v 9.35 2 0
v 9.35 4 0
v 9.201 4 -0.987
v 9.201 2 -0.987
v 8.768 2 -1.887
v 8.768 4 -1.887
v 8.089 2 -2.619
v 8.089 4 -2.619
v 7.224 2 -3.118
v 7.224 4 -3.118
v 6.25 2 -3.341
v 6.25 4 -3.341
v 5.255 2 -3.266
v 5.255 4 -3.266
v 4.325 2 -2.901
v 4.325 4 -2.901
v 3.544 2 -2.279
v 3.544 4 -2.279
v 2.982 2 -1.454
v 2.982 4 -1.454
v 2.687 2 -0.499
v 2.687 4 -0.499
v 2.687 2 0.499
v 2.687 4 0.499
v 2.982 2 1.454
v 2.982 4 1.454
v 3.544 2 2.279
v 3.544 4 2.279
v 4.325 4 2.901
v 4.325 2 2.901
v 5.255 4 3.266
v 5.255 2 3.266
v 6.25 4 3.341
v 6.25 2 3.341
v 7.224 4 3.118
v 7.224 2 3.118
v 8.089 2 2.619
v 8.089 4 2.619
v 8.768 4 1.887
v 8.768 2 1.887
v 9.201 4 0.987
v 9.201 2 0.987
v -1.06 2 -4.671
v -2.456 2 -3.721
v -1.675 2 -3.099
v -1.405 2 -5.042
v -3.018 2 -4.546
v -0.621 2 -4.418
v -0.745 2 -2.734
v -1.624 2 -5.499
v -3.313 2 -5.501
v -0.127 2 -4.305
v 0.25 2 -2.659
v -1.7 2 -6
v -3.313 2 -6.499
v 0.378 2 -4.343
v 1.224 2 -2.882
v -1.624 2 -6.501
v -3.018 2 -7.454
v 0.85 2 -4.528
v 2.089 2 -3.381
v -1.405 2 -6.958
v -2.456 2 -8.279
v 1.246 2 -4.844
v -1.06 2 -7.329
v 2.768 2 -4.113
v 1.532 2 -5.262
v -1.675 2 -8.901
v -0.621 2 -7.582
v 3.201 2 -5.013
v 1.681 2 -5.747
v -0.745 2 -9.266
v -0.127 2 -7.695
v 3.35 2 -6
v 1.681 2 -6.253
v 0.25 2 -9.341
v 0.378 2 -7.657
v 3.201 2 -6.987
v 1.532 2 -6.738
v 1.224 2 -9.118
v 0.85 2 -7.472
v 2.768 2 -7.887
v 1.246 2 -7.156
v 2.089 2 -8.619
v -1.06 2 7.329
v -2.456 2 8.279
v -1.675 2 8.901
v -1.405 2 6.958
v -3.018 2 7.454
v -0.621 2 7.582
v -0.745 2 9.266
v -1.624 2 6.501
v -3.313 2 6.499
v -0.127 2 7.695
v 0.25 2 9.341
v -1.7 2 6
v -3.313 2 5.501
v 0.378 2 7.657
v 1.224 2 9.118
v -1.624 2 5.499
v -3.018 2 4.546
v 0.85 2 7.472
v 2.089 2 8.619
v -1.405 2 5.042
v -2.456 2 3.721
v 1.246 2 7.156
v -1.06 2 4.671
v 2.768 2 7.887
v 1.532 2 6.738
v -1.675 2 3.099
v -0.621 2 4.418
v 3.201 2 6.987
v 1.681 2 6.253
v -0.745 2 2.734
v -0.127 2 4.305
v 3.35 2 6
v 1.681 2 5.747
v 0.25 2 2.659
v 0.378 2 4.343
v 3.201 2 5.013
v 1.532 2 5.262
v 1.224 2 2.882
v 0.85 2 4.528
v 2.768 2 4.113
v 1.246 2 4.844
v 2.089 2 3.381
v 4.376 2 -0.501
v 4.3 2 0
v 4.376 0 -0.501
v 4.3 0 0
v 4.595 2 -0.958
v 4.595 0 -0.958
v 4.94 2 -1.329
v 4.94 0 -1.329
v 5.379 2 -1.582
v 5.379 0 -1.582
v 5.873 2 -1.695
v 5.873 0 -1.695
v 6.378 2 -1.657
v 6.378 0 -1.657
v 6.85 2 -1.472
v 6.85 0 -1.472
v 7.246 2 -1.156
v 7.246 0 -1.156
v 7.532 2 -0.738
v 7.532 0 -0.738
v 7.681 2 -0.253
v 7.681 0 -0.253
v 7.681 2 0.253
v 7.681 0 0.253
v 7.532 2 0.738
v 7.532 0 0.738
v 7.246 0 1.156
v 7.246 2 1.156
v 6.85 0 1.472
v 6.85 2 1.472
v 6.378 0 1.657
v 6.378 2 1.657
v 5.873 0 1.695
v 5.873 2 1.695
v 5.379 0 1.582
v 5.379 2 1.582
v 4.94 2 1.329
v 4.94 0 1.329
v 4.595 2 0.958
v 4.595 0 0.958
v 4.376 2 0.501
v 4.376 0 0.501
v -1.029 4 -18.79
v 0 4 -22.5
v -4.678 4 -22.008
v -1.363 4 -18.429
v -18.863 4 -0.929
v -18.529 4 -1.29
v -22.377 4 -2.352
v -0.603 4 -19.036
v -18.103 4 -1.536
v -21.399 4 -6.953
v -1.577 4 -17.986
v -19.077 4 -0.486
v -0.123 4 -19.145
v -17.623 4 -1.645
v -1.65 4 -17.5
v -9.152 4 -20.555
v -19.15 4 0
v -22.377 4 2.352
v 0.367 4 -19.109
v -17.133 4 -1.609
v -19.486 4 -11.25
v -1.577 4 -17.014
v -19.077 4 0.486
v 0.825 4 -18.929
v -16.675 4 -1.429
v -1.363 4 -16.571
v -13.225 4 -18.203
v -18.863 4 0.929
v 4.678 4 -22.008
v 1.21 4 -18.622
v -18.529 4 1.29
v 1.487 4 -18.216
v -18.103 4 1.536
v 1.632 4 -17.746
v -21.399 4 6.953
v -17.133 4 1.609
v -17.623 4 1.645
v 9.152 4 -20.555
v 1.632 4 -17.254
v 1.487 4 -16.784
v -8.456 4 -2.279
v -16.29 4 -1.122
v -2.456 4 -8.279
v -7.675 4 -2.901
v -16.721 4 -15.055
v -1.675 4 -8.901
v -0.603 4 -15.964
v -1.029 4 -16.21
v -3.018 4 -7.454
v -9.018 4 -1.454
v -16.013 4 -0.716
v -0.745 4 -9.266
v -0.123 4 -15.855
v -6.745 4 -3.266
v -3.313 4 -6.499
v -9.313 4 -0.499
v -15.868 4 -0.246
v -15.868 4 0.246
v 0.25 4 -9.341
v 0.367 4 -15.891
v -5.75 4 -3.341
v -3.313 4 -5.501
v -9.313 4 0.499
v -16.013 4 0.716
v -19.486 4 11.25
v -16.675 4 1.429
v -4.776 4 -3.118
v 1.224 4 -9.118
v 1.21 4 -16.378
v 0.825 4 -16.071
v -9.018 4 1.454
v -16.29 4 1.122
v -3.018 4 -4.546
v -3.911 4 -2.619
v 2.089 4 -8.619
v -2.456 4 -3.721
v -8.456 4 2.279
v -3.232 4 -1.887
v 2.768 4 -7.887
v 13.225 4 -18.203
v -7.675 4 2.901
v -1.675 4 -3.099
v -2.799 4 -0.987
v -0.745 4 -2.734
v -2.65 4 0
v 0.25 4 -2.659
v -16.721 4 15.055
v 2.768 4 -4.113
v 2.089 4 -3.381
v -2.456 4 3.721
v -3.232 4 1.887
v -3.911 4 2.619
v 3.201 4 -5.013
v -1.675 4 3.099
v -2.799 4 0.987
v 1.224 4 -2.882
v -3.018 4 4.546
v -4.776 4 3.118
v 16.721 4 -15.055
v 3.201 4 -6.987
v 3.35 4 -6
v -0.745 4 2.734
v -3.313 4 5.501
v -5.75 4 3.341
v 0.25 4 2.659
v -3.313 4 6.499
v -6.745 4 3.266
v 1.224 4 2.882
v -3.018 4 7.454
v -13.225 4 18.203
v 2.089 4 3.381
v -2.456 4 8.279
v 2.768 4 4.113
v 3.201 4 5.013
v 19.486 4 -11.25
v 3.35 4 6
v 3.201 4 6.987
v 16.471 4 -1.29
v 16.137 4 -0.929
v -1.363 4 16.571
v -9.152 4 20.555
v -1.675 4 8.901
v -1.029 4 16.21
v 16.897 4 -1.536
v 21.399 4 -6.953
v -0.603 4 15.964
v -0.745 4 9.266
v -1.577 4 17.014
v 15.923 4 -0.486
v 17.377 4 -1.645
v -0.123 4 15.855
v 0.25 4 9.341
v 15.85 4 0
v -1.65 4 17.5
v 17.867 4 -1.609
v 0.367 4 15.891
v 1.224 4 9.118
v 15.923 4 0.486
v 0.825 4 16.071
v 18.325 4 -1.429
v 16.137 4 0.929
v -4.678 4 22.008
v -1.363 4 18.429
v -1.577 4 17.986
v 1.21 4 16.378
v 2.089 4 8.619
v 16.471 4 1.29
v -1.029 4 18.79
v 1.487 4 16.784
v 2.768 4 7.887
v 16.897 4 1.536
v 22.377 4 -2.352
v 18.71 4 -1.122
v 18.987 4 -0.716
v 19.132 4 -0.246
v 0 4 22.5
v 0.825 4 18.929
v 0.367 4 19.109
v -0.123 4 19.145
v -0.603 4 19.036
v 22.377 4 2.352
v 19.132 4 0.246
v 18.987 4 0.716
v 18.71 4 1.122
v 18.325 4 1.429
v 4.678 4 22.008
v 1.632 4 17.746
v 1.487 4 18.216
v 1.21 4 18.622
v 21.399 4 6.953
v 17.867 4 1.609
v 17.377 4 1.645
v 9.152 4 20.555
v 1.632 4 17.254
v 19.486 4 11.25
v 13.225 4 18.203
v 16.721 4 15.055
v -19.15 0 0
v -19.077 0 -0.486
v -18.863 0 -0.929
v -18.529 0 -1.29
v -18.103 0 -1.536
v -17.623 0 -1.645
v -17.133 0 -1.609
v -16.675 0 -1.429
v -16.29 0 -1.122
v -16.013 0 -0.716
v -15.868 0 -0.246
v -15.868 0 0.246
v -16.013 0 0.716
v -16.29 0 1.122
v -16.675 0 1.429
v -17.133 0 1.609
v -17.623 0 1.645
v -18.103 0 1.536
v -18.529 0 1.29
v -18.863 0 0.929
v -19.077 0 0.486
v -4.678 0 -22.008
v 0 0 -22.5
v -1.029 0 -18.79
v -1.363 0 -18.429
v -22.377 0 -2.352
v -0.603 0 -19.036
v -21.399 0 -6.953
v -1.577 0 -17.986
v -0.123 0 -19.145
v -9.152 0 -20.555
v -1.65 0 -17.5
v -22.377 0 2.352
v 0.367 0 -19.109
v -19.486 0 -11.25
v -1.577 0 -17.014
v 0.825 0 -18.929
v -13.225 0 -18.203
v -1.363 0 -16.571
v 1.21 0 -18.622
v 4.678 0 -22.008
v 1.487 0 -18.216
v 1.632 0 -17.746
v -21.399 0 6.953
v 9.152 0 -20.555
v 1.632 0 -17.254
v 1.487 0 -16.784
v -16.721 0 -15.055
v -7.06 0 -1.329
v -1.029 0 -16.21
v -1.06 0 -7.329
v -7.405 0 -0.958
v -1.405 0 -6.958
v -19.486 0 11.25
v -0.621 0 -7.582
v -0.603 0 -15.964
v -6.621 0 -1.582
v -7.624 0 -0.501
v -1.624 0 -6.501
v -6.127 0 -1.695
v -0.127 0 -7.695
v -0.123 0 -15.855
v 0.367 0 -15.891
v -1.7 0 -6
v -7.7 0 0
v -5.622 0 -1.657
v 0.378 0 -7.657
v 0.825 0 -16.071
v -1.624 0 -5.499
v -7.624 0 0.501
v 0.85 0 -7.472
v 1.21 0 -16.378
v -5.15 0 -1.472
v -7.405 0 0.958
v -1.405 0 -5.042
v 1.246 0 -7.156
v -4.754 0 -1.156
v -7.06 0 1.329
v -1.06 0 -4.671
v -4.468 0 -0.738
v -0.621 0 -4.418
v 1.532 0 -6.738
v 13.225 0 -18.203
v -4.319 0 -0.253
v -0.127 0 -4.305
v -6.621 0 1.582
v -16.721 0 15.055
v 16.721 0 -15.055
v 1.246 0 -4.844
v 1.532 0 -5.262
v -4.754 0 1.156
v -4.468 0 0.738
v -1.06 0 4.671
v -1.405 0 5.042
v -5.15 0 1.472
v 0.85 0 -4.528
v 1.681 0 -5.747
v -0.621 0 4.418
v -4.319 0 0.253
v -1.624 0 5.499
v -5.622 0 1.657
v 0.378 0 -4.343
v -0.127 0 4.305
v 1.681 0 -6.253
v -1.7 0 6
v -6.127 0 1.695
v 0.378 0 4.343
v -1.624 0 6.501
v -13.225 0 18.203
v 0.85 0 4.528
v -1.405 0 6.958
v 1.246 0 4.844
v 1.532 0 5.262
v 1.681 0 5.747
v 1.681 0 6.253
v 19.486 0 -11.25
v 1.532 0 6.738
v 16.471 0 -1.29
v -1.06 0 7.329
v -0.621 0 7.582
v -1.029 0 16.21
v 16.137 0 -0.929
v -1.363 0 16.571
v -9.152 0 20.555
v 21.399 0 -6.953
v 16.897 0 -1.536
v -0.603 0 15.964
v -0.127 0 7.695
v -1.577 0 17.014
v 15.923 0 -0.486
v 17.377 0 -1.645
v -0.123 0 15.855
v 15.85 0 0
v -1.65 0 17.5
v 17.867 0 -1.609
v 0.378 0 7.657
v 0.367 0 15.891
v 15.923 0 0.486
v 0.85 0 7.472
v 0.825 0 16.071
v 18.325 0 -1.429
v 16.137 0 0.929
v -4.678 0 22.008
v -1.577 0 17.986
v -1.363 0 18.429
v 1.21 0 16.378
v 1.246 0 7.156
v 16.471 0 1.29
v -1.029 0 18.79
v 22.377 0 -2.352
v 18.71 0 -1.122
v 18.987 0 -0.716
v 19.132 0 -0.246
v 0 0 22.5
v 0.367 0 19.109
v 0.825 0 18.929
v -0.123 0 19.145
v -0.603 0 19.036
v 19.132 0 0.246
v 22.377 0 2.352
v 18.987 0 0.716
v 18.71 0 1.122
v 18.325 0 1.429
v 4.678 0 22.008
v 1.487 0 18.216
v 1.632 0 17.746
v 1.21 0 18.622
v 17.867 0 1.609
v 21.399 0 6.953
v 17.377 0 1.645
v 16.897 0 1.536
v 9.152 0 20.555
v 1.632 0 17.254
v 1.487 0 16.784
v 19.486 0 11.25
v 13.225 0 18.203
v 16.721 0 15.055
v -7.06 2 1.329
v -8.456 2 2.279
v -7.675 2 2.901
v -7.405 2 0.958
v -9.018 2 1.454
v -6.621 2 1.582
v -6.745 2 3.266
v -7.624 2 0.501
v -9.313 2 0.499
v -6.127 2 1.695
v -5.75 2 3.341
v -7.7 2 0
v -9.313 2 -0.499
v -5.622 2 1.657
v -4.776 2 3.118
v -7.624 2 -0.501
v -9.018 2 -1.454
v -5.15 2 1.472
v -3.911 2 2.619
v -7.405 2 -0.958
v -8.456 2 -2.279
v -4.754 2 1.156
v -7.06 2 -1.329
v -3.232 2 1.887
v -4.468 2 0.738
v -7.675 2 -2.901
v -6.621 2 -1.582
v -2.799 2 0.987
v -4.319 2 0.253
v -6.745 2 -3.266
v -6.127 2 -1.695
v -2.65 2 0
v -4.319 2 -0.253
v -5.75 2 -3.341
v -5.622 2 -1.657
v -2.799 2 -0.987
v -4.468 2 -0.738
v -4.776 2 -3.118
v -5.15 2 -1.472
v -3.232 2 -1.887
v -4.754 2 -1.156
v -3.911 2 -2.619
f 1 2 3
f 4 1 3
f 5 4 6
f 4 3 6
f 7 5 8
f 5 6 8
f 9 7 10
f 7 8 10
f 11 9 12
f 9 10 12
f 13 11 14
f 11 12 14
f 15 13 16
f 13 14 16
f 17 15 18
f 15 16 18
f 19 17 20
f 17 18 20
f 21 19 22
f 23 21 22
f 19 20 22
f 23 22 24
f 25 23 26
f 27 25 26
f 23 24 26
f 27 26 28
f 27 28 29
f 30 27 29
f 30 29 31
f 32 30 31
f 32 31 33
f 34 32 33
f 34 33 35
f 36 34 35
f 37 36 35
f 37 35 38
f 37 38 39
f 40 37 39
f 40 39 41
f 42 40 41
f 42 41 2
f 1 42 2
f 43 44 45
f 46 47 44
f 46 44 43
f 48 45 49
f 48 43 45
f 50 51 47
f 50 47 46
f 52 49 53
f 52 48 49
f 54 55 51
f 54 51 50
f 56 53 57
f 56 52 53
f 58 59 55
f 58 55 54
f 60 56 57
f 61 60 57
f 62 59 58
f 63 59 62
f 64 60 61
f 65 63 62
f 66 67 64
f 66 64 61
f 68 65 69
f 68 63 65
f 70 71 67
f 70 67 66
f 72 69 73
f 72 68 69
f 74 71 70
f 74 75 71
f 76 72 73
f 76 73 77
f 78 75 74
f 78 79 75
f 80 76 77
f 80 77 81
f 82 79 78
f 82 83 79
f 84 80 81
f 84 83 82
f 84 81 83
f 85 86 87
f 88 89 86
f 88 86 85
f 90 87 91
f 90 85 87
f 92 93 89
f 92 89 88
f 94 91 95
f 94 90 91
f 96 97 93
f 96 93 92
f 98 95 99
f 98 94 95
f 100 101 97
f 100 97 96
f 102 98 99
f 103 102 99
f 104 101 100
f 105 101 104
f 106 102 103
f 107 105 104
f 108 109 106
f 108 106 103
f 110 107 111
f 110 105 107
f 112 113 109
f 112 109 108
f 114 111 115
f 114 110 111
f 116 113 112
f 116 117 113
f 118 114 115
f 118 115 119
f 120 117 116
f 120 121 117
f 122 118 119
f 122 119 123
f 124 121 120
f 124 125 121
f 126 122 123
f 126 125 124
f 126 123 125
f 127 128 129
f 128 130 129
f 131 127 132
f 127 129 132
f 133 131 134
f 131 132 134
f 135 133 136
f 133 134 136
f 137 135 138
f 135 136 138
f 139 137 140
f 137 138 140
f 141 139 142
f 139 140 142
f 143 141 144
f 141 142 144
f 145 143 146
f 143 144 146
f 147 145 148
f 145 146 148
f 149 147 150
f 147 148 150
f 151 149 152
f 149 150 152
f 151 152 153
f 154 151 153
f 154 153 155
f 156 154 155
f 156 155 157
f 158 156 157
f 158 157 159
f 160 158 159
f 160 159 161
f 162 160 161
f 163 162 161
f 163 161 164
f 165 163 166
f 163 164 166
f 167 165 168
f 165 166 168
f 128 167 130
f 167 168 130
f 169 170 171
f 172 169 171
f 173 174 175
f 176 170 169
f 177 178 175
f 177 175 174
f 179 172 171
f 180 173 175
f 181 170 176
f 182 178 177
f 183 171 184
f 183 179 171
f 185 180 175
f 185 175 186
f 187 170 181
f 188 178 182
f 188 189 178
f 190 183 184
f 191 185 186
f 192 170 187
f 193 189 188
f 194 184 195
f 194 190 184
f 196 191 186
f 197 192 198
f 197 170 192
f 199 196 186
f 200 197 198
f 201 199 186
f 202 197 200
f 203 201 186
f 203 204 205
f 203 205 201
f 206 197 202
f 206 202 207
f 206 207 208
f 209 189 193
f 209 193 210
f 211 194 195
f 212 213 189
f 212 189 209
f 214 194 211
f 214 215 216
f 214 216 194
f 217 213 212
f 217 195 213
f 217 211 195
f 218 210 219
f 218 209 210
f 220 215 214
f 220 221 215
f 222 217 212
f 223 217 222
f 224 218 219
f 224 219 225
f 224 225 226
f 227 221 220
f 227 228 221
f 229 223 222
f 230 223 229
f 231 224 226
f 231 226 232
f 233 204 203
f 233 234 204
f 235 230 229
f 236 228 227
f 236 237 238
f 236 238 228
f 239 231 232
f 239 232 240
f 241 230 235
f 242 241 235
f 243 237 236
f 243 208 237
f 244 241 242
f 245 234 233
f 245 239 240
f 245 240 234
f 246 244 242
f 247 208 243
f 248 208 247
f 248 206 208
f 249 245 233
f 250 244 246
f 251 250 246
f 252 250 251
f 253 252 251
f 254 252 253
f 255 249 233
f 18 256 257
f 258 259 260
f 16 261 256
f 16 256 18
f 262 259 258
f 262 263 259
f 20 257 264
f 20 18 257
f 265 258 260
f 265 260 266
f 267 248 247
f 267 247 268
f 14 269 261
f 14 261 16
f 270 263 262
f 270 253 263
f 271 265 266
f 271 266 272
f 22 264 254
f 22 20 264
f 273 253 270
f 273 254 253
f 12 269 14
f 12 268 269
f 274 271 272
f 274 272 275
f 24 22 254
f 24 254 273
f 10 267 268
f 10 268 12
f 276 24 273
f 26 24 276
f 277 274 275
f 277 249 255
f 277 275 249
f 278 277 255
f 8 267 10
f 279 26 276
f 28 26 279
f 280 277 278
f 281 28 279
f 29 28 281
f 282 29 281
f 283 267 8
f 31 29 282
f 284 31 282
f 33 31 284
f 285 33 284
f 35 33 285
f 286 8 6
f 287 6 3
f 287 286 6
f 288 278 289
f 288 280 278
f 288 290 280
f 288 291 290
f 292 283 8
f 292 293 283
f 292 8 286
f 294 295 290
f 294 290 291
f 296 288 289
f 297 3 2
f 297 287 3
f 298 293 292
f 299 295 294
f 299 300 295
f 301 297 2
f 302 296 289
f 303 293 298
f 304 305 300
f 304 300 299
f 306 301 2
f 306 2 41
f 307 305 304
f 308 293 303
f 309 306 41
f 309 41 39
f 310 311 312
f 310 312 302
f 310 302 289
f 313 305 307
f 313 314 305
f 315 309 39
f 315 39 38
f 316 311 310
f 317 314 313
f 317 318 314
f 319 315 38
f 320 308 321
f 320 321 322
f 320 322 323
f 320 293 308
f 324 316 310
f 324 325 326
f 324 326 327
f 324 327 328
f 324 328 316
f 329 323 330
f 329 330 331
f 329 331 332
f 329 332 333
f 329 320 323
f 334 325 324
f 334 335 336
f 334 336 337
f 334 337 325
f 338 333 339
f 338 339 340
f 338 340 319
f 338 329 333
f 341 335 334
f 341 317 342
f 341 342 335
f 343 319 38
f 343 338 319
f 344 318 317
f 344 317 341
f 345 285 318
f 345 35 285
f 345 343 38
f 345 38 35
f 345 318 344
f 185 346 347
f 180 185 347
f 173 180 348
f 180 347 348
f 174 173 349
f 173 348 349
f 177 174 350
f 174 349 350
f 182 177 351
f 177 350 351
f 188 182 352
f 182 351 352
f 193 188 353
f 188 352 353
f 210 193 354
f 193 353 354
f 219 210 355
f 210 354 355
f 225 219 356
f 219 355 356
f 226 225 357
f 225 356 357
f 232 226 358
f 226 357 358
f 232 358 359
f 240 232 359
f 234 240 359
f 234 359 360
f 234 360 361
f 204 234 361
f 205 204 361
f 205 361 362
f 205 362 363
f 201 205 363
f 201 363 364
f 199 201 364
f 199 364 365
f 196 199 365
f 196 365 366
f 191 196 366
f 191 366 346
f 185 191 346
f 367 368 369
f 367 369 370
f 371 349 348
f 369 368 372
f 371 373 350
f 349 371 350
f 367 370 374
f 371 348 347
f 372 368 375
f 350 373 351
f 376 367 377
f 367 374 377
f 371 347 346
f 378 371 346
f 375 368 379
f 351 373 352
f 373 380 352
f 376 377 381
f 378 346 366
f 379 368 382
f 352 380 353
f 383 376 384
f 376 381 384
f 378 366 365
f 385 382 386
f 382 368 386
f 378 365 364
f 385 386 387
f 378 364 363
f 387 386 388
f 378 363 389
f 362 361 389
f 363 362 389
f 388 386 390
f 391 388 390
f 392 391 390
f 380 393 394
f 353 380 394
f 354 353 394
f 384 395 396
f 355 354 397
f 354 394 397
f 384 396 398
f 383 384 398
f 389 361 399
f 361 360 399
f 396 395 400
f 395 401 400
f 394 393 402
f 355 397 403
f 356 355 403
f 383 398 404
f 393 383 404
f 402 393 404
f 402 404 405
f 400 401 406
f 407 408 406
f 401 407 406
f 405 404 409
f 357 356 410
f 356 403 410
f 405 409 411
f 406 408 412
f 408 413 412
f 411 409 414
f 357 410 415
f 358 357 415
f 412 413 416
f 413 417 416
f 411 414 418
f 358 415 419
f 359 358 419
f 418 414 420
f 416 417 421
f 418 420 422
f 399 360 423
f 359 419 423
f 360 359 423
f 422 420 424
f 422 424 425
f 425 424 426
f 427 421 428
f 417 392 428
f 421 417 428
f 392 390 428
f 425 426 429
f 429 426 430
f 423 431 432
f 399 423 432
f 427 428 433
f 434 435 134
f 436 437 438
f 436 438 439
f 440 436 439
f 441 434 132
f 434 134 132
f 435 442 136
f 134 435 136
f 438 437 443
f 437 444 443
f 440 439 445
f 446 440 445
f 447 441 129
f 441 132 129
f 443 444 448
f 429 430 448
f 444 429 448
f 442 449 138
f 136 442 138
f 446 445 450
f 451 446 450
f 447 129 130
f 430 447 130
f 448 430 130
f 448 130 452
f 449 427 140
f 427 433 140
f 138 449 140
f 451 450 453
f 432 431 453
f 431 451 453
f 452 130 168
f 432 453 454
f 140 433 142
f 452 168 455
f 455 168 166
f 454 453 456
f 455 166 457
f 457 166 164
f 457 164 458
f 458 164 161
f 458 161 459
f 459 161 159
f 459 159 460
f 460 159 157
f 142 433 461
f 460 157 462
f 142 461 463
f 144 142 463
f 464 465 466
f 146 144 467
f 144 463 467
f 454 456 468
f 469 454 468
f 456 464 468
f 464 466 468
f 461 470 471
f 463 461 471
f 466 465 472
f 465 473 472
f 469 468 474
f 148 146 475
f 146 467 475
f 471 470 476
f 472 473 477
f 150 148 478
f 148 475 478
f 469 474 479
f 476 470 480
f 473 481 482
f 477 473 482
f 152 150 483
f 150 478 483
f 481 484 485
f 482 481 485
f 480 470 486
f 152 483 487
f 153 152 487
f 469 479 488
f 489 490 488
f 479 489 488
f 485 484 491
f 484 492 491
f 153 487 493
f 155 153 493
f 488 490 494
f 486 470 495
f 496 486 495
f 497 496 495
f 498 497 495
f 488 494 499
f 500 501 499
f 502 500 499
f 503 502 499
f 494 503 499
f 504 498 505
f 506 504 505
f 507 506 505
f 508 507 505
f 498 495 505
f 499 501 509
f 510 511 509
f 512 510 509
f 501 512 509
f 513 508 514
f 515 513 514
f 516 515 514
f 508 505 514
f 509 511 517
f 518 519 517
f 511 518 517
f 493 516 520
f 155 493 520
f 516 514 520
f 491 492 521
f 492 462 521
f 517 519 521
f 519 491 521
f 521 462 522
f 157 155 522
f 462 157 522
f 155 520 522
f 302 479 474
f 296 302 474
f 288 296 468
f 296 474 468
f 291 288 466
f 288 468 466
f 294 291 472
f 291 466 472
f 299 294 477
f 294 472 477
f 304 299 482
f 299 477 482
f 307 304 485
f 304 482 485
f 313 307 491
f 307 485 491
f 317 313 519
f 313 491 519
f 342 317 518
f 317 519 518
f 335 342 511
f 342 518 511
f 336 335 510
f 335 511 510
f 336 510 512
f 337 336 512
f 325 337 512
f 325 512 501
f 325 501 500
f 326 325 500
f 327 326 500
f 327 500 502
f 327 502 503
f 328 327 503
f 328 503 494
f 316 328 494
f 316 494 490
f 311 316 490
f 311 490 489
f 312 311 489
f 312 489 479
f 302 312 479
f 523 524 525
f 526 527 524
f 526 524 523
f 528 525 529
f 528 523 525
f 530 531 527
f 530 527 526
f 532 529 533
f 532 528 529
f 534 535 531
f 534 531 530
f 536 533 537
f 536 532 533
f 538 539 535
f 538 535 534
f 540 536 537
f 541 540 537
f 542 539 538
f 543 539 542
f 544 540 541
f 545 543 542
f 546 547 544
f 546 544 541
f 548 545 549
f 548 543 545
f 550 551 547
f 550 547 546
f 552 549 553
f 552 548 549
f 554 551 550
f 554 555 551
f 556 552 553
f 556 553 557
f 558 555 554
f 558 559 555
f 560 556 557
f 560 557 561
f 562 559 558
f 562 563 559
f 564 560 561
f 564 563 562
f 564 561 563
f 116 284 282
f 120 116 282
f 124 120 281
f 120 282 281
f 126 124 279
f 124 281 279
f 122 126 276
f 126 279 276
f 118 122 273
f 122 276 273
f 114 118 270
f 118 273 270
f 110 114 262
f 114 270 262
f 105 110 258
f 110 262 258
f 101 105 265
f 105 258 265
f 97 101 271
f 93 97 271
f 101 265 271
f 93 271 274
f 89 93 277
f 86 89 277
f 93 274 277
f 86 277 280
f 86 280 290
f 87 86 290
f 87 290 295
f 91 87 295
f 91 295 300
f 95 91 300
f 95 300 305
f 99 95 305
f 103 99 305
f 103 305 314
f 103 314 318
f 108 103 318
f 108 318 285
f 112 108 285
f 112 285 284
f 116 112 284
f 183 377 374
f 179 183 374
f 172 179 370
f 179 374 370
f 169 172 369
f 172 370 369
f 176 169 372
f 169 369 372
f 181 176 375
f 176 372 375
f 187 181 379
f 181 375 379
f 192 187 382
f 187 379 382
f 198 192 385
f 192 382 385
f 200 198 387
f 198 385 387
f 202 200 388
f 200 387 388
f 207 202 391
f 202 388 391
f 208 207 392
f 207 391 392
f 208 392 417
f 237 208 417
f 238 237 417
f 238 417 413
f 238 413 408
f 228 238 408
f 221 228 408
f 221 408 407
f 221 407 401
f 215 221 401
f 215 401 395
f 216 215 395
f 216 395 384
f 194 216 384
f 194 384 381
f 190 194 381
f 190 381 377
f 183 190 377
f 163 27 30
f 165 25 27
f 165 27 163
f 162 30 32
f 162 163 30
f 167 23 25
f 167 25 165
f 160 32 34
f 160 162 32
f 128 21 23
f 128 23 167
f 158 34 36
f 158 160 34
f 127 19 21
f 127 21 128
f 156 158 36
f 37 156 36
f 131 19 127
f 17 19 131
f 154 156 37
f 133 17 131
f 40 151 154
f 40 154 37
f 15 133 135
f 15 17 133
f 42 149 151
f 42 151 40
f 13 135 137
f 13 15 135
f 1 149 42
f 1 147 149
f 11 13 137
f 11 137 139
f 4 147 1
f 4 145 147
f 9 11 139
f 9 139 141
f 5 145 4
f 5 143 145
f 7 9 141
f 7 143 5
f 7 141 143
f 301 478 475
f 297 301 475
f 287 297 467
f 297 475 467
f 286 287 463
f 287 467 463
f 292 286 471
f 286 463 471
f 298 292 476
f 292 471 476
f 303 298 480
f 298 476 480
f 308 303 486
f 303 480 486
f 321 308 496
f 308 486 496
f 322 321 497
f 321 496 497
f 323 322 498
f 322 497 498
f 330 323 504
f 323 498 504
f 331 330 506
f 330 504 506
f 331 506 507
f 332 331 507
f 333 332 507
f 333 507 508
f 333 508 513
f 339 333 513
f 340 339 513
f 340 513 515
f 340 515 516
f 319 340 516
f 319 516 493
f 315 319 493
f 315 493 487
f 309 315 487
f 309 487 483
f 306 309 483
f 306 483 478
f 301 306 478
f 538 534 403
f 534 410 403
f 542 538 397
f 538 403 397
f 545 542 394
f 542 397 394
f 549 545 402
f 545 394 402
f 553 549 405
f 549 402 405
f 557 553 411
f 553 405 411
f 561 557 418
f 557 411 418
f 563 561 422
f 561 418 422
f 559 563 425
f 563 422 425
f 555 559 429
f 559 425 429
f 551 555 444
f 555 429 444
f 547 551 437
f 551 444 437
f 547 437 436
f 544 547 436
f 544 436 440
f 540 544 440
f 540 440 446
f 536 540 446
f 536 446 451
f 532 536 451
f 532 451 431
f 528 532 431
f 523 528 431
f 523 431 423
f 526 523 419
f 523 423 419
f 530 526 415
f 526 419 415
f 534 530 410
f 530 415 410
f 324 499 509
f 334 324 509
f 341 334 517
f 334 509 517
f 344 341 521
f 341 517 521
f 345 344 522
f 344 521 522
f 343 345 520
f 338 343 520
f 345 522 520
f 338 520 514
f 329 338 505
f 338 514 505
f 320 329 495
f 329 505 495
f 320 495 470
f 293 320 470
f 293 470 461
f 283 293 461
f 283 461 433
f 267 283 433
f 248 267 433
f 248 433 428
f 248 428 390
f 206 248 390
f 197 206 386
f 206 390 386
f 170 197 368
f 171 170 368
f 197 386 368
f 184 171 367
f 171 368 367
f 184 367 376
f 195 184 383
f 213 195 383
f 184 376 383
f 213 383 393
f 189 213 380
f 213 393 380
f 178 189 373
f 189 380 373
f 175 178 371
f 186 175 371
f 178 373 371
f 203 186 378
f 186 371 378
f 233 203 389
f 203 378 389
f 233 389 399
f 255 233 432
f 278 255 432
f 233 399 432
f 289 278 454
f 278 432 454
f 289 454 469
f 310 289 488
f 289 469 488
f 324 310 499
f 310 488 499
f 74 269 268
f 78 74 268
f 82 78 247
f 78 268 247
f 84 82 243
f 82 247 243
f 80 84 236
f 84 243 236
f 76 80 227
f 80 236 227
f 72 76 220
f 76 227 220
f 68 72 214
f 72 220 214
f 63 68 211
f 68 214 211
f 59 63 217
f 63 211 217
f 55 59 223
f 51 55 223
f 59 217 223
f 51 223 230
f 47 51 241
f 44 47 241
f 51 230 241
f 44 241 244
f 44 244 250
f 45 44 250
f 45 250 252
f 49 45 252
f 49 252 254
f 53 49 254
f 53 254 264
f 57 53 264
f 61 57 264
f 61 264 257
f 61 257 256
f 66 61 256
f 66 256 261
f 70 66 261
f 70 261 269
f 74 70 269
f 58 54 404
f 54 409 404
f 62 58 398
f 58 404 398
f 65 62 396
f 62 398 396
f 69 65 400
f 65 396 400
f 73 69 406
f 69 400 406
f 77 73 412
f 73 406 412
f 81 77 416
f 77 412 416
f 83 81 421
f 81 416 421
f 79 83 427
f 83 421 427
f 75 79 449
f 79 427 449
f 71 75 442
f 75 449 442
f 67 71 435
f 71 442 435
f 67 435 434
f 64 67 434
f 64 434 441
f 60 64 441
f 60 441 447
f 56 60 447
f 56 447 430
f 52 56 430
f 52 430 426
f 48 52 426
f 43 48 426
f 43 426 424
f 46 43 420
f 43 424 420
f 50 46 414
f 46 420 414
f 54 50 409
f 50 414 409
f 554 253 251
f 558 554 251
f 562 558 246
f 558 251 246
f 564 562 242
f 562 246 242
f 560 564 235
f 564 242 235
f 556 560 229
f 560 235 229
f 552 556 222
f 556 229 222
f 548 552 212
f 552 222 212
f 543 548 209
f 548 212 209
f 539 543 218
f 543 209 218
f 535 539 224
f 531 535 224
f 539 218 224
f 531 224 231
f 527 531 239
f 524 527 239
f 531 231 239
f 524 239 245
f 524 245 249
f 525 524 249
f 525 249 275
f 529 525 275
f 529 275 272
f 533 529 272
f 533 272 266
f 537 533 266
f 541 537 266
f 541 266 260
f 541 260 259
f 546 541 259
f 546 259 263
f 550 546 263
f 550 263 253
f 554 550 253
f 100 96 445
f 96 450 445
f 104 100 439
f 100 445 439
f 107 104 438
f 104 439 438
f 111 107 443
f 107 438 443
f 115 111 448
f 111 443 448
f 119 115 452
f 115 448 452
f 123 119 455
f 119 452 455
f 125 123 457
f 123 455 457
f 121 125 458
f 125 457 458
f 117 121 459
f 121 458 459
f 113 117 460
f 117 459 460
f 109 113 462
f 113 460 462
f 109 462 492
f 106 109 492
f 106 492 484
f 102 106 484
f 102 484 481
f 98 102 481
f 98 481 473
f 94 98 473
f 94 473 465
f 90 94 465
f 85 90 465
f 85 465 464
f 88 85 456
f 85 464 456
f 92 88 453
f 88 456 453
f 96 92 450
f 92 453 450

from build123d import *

# Parameters (mm, degrees)
SKETCH_1_R                  = 22.5
EXTRUDE_1_DEPTH             = 4
HOLE_WIZARD_M31_D           = 3.4
HOLE_WIZARD_M31_CBORE_D     = 6.7
HOLE_WIZARD_M31_CBORE_DEPTH = 2
M4X0_71_D                   = 3.3


with BuildPart() as part:
    # Эскиз1 → Бобышка-Вытянуть1 (new body)
    with BuildSketch(Plane(origin=(0, 0, 0), x_dir=(1, 0, 0), z_dir=(0, 1, 0))):
        with Locations(Location((0, 0, 0), (0, 0, 270))):
            Circle(SKETCH_1_R)
    extrude(amount=EXTRUDE_1_DEPTH)

    # Цековка для  винта с полукруглой головкой M31 (through all)
    with Locations(Plane(origin=(0, 4, 0), x_dir=(1, 0, 0), z_dir=(0, 1, 0))):
        with Locations((0, 6), (-6, 0), (0, -6), (6, 0)):
            CounterBoreHole(HOLE_WIZARD_M31_D / 2, HOLE_WIZARD_M31_CBORE_D / 2, HOLE_WIZARD_M31_CBORE_DEPTH)

    # Отверстие обработанное метчиком M4x0.71 (through all)
    with Locations(Plane(origin=(0, 4, 0), x_dir=(1, 0, 0), z_dir=(0, 1, 0))):
        with Locations((-17.5, 0), (0, -17.5), (17.5, 0), (0, 17.5)):
            Hole(M4X0_71_D / 2)


solid = part.part
